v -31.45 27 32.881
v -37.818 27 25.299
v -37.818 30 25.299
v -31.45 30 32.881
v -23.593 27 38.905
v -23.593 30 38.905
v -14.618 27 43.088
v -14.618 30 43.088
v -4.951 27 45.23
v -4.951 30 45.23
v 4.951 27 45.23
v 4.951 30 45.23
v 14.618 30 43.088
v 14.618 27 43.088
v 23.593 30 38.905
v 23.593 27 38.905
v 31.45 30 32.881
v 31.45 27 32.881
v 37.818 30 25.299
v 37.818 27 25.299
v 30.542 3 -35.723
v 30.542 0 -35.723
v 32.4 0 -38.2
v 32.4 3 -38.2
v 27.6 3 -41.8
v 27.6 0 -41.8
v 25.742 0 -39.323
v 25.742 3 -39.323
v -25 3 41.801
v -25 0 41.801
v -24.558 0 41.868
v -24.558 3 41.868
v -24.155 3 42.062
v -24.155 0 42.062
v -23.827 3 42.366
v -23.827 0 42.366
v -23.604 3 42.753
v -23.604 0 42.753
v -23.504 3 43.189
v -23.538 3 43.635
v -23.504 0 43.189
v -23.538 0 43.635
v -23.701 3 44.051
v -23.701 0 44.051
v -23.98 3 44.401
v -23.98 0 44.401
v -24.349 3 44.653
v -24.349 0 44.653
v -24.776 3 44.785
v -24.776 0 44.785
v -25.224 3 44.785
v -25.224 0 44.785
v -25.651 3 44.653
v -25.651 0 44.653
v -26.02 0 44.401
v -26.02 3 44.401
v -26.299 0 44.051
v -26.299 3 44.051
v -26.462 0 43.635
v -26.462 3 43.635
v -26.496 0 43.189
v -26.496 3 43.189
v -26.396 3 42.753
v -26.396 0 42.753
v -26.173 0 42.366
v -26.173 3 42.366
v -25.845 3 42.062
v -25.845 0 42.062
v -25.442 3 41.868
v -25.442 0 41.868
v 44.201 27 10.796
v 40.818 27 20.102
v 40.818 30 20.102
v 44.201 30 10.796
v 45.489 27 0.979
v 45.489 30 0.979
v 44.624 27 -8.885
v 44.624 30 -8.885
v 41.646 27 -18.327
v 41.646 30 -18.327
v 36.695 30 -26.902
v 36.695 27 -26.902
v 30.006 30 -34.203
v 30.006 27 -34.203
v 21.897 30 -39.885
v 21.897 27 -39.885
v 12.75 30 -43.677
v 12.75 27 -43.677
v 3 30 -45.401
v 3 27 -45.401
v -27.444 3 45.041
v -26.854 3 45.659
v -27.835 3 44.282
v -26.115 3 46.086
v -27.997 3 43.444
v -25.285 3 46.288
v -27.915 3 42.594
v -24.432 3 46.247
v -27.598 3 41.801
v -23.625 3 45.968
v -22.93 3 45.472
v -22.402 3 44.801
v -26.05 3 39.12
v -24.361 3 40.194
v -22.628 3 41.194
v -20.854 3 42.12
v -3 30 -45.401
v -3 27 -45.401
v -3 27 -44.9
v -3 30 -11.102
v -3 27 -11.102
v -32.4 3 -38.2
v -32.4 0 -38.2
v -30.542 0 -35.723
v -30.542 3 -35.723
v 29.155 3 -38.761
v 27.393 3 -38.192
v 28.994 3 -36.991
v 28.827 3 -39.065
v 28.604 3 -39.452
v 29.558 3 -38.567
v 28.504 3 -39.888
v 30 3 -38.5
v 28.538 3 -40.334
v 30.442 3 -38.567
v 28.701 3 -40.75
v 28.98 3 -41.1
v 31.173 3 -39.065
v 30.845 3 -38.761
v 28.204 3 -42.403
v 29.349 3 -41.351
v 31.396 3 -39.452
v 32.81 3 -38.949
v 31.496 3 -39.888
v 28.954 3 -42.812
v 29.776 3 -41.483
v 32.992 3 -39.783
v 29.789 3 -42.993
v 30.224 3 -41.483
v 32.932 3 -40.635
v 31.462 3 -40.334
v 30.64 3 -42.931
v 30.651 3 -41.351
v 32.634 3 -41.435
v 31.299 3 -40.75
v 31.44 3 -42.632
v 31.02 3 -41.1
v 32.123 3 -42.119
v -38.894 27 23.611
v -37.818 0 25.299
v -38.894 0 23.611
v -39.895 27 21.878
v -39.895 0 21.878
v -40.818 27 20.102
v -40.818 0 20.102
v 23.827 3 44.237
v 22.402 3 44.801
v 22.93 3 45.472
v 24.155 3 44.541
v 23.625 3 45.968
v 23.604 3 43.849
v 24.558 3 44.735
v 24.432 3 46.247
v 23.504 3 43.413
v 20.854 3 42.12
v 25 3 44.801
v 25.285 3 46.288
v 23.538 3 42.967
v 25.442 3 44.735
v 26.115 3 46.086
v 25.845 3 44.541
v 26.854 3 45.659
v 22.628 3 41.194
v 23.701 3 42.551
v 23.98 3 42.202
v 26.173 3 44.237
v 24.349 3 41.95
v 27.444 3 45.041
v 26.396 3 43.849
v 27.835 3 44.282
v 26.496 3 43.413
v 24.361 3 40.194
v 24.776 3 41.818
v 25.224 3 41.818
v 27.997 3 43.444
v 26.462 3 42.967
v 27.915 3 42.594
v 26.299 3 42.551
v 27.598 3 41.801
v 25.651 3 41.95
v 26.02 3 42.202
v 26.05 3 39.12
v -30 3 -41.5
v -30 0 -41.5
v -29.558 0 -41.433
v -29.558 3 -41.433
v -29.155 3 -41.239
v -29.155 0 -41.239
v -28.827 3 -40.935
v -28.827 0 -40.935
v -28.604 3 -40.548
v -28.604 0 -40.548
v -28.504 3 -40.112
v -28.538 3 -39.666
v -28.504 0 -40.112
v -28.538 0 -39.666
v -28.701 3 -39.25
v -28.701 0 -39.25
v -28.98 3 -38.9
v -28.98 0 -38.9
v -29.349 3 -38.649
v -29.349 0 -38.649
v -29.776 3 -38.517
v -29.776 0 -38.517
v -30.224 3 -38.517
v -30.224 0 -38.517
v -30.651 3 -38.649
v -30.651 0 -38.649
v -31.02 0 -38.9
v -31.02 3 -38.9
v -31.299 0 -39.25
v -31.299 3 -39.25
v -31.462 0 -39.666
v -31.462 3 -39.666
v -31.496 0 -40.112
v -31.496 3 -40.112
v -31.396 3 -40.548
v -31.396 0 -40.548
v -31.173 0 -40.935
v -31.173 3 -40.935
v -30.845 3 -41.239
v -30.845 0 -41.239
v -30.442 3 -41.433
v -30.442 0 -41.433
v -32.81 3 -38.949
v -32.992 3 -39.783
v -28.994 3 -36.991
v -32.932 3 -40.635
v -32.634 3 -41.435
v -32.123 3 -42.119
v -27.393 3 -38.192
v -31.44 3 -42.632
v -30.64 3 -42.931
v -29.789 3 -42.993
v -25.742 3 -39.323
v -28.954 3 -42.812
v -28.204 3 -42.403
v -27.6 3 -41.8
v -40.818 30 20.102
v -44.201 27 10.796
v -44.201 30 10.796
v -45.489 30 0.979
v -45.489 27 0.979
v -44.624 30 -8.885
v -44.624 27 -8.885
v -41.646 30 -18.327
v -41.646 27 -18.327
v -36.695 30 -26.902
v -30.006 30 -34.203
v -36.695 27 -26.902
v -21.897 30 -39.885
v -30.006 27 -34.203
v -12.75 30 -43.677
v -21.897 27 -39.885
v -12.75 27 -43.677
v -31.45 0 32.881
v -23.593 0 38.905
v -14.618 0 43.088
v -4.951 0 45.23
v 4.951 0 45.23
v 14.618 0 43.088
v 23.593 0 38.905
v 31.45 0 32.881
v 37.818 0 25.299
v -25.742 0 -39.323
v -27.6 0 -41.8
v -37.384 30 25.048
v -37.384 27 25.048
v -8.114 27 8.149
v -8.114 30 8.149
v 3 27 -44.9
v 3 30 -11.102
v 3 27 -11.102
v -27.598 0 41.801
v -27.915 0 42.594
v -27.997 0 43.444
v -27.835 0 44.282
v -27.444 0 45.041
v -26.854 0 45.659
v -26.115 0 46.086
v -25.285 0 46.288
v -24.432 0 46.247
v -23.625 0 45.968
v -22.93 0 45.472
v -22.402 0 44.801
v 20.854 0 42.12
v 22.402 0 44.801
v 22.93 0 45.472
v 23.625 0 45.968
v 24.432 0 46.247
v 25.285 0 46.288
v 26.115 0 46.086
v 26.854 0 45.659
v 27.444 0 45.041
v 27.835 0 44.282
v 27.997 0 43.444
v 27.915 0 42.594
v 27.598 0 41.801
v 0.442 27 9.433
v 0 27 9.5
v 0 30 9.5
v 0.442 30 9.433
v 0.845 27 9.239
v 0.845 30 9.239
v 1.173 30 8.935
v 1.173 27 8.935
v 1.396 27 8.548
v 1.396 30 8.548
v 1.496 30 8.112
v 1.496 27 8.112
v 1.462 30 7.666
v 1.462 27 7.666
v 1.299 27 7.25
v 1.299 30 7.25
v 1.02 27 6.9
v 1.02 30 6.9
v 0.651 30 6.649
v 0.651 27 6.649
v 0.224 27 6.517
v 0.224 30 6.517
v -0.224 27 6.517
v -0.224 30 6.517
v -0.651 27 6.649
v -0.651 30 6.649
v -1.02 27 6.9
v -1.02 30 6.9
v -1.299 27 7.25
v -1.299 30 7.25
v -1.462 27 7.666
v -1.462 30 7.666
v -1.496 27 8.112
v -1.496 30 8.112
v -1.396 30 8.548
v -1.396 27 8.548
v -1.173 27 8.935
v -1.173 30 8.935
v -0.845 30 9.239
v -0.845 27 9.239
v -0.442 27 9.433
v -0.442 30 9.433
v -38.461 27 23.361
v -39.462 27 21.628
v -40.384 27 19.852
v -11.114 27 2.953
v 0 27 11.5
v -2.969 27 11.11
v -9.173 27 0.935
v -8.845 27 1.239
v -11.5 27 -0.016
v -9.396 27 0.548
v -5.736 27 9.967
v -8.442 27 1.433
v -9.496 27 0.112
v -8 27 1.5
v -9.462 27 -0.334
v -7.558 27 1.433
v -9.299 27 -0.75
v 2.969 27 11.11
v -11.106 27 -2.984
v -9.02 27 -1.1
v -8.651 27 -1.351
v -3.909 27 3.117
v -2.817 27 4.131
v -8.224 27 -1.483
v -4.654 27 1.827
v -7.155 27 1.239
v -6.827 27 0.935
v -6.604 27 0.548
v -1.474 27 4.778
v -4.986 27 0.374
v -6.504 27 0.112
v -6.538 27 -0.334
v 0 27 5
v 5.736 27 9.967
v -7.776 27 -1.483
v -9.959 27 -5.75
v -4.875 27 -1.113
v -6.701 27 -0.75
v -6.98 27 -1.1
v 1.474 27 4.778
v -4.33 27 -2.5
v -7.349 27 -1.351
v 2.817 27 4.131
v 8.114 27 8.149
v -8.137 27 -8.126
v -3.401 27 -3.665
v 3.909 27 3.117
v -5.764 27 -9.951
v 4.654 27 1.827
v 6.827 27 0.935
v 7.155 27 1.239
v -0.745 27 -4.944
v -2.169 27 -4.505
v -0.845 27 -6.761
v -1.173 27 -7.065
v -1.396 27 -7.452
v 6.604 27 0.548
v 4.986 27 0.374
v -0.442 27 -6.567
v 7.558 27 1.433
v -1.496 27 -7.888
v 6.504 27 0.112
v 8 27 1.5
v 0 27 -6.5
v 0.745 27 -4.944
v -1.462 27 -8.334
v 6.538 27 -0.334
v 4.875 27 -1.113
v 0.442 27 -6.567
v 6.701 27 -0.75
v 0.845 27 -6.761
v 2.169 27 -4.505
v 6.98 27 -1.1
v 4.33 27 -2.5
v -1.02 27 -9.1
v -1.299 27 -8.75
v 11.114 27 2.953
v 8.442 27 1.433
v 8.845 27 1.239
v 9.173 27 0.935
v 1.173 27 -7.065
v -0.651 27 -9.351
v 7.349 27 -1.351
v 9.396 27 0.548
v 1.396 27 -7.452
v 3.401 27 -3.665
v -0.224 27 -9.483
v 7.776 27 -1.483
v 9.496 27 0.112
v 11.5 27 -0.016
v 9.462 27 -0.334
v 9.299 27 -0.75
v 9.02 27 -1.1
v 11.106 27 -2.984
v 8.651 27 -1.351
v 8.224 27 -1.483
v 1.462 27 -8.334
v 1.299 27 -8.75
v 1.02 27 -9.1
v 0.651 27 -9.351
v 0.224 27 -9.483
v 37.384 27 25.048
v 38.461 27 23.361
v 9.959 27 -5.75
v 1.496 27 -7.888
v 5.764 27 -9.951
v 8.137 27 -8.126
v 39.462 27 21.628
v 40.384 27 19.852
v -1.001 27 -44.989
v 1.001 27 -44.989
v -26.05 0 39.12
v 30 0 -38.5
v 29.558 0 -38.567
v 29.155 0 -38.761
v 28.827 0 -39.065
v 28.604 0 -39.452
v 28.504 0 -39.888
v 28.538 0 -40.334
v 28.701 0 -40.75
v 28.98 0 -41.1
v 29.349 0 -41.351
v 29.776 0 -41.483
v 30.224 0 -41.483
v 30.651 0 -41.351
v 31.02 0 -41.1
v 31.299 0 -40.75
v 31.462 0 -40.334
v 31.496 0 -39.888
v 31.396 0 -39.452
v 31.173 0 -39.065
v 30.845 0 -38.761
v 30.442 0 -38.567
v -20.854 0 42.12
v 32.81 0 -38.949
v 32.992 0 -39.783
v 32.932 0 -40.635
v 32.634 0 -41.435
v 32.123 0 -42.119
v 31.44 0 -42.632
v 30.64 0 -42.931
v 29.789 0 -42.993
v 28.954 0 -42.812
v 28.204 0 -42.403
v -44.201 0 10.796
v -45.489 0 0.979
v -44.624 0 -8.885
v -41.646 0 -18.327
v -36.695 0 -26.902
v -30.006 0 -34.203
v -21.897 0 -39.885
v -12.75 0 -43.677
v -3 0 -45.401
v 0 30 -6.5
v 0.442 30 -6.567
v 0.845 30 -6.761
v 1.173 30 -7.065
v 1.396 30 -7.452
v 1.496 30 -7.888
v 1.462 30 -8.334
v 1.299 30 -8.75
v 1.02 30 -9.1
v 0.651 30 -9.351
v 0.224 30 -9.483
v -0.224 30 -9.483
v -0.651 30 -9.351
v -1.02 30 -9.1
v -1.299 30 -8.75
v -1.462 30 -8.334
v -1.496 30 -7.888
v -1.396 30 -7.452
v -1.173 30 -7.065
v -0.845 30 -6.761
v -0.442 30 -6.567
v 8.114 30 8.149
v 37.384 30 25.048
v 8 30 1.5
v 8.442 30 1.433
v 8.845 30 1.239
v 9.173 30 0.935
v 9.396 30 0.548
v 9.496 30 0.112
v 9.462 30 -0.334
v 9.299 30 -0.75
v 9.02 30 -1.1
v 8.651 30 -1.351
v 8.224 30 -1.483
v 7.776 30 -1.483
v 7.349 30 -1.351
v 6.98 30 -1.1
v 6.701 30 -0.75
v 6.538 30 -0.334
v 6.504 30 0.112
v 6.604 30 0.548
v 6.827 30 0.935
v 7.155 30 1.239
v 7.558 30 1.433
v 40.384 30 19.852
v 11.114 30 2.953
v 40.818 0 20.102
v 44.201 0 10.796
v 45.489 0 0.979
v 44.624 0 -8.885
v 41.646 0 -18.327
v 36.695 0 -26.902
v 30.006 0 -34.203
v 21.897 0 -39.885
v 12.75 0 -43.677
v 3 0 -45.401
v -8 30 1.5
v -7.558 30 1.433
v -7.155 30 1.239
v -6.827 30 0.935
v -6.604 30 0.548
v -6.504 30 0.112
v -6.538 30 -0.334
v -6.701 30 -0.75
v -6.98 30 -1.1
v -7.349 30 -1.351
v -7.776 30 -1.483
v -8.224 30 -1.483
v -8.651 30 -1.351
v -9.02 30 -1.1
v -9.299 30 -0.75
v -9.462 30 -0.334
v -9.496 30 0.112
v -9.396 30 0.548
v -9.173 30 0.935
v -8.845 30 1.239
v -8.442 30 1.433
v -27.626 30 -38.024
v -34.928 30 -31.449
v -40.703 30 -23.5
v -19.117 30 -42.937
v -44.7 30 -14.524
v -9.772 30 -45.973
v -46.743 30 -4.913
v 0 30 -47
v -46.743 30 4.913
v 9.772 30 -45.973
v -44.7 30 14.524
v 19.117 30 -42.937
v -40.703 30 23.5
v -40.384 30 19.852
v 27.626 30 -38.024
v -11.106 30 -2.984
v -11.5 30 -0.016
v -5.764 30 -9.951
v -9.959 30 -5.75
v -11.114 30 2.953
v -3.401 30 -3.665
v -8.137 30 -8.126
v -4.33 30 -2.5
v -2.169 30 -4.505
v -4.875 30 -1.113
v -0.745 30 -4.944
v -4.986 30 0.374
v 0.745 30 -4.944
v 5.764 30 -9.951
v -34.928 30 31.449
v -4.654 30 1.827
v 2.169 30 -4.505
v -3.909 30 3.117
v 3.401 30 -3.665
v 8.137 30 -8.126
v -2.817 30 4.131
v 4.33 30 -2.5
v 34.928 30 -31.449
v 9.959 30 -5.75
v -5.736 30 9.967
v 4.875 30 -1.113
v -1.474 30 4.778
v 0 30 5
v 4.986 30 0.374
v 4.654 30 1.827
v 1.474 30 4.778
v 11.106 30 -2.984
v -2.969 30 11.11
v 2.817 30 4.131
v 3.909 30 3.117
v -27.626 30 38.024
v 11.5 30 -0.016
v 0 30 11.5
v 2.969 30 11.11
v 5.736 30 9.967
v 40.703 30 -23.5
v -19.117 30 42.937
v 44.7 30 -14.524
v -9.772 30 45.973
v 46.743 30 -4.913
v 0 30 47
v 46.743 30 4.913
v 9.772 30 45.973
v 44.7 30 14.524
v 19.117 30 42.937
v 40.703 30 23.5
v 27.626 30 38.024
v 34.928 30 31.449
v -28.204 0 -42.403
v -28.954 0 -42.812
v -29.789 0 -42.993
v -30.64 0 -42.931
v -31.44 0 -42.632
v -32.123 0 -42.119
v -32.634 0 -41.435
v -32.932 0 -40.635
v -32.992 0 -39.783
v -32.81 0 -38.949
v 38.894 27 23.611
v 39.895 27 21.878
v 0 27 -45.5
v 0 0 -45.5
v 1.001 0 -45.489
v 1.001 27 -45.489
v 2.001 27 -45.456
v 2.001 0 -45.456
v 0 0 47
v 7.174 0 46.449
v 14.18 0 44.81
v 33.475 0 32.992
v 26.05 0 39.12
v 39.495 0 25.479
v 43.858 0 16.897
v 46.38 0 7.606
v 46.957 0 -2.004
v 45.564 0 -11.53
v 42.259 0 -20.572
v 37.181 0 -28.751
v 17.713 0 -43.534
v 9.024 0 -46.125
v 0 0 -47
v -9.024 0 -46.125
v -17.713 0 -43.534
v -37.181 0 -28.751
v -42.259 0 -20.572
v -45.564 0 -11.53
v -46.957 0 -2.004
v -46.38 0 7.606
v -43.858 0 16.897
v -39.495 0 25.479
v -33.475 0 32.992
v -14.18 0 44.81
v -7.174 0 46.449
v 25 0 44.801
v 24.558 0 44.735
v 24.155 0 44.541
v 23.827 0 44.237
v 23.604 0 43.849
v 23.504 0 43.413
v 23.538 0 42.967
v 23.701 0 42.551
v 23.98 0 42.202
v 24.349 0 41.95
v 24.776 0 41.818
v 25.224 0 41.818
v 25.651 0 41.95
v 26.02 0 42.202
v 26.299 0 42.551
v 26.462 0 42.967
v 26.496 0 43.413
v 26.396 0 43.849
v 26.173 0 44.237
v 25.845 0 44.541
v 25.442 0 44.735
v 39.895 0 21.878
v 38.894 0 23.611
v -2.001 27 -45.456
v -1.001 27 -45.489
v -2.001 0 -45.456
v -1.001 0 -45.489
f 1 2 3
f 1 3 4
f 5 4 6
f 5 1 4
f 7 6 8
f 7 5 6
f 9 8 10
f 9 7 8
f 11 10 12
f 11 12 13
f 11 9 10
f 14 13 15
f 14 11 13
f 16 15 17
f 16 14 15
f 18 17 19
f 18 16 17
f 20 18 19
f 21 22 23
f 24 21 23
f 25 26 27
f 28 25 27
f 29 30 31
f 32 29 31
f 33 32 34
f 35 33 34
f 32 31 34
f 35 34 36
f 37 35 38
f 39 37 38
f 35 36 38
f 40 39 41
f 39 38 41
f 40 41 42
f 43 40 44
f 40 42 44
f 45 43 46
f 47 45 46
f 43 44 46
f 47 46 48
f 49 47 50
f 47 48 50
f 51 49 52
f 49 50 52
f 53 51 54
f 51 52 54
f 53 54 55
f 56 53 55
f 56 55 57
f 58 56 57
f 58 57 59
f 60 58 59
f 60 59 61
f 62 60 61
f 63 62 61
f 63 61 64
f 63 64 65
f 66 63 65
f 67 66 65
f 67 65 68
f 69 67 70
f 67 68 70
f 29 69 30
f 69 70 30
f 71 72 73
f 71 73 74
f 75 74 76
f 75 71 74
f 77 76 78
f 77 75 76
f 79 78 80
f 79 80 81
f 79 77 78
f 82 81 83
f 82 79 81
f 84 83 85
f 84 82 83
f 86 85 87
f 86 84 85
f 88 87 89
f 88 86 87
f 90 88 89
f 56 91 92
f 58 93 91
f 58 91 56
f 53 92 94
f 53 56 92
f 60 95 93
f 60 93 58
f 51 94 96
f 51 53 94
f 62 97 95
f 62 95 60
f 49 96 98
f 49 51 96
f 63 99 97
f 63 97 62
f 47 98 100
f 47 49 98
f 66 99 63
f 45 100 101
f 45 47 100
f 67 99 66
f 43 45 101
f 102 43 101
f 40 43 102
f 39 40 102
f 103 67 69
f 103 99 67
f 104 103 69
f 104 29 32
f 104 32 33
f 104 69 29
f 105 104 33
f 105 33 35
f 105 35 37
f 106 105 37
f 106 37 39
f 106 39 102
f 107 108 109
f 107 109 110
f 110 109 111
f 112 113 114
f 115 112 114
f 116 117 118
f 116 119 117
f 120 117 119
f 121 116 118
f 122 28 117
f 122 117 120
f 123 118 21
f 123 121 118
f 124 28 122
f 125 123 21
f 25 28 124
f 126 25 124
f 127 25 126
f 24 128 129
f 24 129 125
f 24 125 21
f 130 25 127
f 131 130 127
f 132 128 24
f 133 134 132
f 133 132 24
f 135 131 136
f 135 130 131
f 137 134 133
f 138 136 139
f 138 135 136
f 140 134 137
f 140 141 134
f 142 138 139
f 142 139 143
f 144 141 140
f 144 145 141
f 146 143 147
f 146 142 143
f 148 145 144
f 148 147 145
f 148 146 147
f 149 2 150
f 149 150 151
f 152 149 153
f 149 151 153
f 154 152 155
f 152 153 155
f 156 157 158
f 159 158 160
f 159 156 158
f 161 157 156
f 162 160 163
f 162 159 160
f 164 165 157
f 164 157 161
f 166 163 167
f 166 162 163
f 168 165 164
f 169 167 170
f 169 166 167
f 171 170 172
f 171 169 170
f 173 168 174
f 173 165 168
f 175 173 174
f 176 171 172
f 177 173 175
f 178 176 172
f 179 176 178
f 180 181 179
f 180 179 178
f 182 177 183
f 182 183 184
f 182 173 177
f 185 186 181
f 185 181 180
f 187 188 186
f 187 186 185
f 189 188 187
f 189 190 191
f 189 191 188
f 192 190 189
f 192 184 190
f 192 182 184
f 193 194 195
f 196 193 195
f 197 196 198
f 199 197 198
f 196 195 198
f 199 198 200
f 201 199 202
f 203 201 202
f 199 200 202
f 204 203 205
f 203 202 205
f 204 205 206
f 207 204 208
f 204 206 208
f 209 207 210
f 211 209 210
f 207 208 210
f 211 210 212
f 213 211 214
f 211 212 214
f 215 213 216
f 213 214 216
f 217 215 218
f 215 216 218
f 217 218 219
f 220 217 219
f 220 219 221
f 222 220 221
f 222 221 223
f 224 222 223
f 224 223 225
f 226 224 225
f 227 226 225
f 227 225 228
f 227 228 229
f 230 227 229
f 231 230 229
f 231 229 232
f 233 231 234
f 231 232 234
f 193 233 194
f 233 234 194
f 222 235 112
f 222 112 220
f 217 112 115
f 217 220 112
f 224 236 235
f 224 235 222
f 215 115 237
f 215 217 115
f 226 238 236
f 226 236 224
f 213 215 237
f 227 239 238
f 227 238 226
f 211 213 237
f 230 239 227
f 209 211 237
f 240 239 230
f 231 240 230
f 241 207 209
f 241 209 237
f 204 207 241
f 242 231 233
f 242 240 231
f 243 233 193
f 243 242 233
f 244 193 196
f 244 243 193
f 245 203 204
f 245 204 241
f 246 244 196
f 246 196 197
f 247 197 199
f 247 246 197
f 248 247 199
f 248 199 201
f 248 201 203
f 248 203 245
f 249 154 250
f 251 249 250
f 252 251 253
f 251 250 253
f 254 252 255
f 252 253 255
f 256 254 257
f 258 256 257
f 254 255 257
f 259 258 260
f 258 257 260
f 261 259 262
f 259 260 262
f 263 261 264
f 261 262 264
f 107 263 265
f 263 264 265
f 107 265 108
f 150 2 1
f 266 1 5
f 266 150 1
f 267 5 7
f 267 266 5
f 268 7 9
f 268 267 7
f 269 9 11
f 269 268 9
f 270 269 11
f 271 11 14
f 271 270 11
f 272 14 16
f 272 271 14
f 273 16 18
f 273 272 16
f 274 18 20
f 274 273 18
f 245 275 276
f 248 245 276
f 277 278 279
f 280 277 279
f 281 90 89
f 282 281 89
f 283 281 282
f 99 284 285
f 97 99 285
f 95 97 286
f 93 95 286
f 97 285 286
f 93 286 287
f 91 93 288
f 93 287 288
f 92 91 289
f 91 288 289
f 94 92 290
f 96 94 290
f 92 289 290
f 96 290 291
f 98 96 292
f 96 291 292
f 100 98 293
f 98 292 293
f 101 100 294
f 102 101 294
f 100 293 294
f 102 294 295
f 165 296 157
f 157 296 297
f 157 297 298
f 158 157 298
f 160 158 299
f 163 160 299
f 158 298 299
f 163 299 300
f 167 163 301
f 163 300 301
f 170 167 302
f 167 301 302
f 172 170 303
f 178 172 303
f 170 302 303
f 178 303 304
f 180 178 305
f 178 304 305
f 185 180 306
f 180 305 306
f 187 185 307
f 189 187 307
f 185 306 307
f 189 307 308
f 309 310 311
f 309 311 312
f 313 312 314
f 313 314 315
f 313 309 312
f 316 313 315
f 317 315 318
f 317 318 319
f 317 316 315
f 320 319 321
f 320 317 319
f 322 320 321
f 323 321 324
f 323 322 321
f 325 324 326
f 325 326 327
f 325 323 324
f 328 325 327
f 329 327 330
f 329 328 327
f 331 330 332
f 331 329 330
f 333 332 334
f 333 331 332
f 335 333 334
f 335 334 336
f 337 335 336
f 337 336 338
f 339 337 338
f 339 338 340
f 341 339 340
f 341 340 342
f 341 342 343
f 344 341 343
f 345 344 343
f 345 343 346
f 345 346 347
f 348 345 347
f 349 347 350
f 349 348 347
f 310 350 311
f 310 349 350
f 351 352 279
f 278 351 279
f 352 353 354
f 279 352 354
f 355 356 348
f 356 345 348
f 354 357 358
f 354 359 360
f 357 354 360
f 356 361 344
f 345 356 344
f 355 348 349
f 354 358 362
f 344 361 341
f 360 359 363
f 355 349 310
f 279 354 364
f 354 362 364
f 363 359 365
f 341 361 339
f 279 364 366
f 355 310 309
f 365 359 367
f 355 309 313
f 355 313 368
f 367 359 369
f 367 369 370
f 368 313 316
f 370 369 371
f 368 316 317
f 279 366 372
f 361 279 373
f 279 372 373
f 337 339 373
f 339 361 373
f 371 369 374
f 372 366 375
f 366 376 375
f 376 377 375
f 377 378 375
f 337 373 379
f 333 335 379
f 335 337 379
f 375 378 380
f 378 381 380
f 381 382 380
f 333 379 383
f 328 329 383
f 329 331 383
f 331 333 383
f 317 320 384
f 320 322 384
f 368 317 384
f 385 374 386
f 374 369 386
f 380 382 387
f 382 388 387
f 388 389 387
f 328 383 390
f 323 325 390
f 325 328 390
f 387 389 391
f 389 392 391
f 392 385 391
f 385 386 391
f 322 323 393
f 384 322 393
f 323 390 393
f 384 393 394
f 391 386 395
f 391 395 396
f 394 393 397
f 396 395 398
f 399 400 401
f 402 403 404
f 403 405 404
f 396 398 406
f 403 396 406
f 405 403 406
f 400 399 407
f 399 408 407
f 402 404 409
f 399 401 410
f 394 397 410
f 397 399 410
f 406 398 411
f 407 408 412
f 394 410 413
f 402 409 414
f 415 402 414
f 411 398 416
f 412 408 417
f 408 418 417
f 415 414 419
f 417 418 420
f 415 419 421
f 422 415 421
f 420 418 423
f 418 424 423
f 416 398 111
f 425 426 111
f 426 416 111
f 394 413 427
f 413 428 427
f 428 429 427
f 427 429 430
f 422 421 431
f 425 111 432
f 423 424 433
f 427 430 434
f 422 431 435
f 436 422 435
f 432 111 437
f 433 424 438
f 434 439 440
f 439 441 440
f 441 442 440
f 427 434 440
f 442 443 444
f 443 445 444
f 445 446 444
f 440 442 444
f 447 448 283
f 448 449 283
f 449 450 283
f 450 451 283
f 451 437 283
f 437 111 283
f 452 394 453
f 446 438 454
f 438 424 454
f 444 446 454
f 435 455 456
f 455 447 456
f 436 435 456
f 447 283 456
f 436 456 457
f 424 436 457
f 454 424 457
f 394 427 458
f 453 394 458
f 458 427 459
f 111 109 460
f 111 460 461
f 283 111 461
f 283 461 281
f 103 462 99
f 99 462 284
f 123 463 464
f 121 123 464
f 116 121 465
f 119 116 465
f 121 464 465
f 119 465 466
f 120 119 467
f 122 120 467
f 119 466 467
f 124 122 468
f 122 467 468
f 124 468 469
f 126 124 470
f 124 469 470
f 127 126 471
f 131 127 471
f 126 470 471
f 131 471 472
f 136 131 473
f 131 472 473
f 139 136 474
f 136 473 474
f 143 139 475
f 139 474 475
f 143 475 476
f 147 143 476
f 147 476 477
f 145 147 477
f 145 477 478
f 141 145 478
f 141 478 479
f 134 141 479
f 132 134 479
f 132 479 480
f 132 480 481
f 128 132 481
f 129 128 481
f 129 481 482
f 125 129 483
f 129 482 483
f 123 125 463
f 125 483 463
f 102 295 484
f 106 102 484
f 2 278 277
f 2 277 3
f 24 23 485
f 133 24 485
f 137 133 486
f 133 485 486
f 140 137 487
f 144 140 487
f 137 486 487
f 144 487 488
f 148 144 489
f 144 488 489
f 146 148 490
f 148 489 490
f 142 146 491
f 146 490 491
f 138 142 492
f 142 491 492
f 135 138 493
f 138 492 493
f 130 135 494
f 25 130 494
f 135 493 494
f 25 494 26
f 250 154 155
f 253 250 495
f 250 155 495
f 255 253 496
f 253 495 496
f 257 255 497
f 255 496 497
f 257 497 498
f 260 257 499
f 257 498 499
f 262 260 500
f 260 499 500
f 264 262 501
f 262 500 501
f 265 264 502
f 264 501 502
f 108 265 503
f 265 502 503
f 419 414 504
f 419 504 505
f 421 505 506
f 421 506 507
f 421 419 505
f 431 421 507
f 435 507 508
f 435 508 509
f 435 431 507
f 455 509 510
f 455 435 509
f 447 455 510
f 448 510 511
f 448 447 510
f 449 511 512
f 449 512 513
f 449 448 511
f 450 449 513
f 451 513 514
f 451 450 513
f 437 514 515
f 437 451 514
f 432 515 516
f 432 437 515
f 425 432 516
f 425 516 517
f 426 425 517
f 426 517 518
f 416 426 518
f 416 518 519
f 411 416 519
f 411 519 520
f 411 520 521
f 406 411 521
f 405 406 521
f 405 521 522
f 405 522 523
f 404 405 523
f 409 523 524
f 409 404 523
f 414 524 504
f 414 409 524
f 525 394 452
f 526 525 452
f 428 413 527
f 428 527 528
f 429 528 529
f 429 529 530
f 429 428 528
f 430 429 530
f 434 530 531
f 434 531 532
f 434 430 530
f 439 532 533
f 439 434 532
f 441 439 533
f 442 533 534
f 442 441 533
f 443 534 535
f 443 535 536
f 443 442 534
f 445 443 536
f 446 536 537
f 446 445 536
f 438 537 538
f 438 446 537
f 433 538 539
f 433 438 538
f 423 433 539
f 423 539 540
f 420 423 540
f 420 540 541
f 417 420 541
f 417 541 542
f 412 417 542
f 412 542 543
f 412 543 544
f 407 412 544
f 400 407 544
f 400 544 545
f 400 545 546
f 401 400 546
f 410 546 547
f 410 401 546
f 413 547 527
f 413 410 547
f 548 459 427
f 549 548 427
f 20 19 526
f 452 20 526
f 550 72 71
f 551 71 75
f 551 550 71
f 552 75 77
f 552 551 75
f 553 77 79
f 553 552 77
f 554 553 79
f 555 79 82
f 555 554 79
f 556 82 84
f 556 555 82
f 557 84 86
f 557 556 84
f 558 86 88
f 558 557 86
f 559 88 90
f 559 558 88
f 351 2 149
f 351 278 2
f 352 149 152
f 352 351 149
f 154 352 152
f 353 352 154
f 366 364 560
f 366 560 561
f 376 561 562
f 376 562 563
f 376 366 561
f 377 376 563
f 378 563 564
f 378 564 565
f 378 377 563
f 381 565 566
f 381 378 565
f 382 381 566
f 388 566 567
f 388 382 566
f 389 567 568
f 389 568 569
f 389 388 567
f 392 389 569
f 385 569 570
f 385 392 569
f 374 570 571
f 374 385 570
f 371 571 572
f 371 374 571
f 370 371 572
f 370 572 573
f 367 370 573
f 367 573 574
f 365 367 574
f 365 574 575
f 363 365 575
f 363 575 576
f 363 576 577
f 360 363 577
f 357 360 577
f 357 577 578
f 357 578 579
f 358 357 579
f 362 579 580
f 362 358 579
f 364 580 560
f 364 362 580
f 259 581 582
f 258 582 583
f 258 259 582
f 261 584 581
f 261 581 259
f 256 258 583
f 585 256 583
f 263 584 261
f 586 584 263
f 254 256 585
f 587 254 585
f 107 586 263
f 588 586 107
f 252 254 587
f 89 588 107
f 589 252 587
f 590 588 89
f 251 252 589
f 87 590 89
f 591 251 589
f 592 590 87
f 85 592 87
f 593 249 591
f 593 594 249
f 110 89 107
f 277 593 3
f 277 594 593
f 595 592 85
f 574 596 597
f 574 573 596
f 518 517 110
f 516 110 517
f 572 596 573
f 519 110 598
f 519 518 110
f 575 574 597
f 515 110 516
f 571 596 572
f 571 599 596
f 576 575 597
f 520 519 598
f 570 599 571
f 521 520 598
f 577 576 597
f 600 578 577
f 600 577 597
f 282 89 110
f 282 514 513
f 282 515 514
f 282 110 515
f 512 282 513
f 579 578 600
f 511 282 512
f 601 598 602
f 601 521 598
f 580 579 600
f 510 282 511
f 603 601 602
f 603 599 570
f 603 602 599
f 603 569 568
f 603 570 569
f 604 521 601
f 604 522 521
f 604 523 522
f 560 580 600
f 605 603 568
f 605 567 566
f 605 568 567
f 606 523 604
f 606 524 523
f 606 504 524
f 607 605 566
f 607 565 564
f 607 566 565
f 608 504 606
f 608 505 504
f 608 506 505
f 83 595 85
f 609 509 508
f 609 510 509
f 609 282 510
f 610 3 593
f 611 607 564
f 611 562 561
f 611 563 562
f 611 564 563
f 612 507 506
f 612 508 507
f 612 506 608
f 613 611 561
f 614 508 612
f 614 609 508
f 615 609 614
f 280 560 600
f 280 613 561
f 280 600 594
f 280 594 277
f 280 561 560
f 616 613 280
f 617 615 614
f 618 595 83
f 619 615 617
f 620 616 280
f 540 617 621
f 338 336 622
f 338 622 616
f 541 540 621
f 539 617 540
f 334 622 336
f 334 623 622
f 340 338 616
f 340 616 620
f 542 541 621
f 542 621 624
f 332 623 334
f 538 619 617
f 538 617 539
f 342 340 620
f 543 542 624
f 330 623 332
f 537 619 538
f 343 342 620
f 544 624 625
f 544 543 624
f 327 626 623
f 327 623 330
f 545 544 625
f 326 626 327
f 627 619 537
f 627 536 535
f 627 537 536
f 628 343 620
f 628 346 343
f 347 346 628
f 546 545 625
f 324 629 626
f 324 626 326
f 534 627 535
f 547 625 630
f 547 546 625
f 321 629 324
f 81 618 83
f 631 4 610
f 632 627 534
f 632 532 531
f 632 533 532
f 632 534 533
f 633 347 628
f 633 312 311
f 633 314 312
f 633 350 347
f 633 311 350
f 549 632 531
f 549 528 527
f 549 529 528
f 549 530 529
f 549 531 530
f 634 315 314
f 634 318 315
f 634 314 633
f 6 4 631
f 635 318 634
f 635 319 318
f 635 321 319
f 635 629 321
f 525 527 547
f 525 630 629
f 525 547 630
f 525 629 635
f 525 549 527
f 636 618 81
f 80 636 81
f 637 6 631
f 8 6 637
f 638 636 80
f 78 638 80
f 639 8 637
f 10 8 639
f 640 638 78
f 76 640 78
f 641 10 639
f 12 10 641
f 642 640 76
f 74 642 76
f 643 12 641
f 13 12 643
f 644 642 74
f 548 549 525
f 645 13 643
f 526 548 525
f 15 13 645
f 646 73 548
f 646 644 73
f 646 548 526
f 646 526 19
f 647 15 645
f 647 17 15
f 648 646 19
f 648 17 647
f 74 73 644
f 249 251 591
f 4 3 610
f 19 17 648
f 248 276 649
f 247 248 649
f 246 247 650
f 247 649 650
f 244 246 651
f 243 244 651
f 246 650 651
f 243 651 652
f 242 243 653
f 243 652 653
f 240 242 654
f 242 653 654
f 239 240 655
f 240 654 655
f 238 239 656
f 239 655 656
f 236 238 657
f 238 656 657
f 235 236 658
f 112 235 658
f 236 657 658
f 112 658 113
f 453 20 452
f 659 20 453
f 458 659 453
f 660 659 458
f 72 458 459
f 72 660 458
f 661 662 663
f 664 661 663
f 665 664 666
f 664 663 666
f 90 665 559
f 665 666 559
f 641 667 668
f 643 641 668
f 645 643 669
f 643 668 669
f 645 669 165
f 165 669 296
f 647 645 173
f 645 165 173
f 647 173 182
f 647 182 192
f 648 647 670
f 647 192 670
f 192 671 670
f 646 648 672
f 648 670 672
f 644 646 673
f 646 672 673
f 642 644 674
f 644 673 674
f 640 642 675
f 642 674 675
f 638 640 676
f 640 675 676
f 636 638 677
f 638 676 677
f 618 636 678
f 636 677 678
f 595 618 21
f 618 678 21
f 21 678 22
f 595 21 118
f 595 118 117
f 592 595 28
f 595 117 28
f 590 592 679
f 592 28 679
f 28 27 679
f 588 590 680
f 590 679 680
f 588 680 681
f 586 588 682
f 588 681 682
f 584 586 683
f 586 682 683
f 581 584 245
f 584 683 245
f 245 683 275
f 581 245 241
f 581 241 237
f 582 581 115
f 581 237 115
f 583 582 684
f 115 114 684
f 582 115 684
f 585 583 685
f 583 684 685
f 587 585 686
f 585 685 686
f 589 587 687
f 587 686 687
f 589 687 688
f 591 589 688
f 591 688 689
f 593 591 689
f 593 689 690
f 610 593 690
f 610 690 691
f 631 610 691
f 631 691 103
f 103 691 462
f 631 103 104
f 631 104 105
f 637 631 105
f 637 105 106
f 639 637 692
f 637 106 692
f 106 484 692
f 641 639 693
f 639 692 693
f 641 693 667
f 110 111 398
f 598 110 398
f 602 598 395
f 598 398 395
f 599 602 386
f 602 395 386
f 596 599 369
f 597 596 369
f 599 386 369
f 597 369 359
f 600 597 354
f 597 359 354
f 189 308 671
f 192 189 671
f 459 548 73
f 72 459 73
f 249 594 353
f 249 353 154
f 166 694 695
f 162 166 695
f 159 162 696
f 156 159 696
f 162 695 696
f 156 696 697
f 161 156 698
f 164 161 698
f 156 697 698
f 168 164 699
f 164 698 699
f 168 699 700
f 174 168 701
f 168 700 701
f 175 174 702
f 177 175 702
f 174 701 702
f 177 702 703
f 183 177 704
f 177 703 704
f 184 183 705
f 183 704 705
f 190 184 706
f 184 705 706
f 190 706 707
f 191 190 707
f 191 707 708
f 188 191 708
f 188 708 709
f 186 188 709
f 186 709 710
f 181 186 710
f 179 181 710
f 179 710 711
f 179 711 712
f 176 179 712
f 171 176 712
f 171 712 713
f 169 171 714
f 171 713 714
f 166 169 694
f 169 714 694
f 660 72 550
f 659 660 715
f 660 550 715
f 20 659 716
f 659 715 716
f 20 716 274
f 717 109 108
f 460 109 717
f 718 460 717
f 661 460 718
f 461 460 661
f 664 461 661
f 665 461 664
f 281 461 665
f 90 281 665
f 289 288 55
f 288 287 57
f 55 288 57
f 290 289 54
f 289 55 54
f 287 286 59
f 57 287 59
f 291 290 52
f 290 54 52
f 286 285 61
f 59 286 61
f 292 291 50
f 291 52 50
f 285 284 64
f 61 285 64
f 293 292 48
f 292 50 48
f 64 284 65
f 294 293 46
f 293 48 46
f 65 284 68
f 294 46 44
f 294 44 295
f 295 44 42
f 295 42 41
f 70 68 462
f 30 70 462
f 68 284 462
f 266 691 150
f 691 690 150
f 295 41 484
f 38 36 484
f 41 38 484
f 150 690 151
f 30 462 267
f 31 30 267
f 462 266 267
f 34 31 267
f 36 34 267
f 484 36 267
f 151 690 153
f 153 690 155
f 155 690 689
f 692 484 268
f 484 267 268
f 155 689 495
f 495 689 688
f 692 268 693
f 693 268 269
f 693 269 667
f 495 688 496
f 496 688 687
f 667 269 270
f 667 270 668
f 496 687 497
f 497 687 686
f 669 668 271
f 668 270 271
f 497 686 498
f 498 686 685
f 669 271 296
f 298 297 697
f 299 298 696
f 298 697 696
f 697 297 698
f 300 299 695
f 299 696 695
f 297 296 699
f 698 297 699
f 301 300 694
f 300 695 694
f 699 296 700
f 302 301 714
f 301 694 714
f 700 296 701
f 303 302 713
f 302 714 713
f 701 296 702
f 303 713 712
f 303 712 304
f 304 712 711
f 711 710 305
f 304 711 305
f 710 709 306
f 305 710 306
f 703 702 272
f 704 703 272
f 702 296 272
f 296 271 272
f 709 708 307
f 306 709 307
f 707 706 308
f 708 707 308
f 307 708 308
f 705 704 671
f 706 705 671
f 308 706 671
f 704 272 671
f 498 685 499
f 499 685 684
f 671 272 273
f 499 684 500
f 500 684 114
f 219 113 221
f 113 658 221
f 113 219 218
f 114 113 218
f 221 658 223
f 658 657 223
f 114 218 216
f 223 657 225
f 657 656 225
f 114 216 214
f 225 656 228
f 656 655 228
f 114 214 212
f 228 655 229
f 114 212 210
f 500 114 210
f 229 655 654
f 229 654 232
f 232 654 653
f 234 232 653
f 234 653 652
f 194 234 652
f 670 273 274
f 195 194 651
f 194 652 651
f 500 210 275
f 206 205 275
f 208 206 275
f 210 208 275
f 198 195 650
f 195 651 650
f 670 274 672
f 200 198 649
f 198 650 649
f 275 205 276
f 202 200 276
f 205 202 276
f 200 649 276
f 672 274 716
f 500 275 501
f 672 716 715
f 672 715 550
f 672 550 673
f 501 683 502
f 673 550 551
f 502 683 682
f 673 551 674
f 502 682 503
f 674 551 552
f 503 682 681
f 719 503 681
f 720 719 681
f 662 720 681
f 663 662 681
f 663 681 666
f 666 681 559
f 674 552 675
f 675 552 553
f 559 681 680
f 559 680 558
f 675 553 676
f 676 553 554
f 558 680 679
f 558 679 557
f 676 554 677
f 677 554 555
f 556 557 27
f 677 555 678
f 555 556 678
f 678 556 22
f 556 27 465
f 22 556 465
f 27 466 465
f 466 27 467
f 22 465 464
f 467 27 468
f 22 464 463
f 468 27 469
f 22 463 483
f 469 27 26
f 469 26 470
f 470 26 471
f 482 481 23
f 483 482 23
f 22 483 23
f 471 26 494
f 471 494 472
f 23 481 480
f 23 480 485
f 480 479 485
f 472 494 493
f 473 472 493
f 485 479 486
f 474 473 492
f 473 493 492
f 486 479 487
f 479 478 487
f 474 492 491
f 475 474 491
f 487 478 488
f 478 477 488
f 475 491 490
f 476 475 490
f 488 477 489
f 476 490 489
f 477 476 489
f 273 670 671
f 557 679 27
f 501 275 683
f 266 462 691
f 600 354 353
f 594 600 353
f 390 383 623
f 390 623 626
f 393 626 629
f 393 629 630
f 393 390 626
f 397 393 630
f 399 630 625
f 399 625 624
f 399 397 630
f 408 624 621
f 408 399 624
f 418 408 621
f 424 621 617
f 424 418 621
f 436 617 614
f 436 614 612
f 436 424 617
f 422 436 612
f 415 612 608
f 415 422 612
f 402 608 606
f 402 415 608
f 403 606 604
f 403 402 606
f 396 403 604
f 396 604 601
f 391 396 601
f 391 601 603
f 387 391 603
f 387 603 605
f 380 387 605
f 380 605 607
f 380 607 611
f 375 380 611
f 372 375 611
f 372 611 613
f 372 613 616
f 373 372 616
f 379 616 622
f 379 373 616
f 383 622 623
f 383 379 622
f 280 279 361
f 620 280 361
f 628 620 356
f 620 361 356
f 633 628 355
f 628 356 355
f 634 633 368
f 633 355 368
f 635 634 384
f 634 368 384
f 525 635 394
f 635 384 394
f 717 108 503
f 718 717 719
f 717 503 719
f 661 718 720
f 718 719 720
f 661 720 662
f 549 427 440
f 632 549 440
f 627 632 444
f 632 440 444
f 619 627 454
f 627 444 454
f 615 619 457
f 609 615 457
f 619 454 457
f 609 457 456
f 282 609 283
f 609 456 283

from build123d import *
from build123d.topology import SkipClean

# Parameters (mm, degrees)
SKETCH_1_R          = 47
SKETCH_1_R_2        = 45
EXTRUDE_1_DEPTH     = 30
SKETCH_2_R          = 1.5
EXTRUDE_5_DEPTH     = 3
EXTRUDE_START       = -3
SKETCH_3_R          = 5
SKETCH_3_R_2        = 1.5
EXTRUDE_6_DEPTH     = 3
CUT_EXTRUDE_1_DEPTH = 30
CUT_EXTRUDE_START   = 44
SKETCH_5_R          = 45.5
CUT_EXTRUDE_2_DEPTH = 44


with BuildPart() as part:
    # 草图1 → 凸台-拉伸1 (new body)
    with BuildSketch(Plane(origin=(0, 0, 0), x_dir=(1, 0, 0), z_dir=(0, 1, 0))):
        with Locations(Location((0, 0, 0), (0, 0, 270))):
            Circle(SKETCH_1_R)
        with Locations(Location((0, 0, 0), (0, 0, 270))):
            Circle(SKETCH_1_R_2, mode=Mode.SUBTRACT)
    extrude(amount=EXTRUDE_1_DEPTH)

    # 草图2 → 凸台-拉伸5 (add)
    # profile 1 of 4: a face of its own
    with SkipClean():  # the faces are left unmerged after this step: merging them gives an invalid solid
        with BuildSketch(Plane(origin=(0, 0, 0), x_dir=(-1, 0, 0), z_dir=(0, -1, 0))):
            with BuildLine():
                Line((22.401923789, -44.801270189), (19.851868109, -40.38444419))
                ThreePointArc((19.851868109, -40.38444419), (22.5, -38.97114317), (25.048020532, -37.38444419))
                Line((25.048020532, -37.38444419), (27.598076211, -41.801270189))
                ThreePointArc((27.598076211, -41.801270189), (26.5, -45.899346401), (22.401923789, -44.801270189))
            make_face()
            with Locations(Location((25, -43.301270189, 0), (0, 0, 90))):
                Circle(SKETCH_2_R, mode=Mode.SUBTRACT)
        # profile 2 of 4: a face of its own
        with BuildSketch(Plane(origin=(0, 0, 0), x_dir=(-1, 0, 0), z_dir=(0, -1, 0))):
            with BuildLine():
                Line((-27.598076211, -41.801270189), (-25.048020532, -37.38444419))
                ThreePointArc((-25.048020532, -37.38444419), (-22.5, -38.97114317), (-19.851868109, -40.38444419))
                Line((-19.851868109, -40.38444419), (-22.401923789, -44.801270189))
                ThreePointArc((-22.401923789, -44.801270189), (-26.5, -45.899346401), (-27.598076211, -41.801270189))
            make_face()
            with Locations(Location((-25, -43.301270189, 0), (0, 0, 270))):
                Circle(SKETCH_2_R, mode=Mode.SUBTRACT)
        # profile 3 of 4: a face of its own
        with BuildSketch(Plane(origin=(0, 0, 0), x_dir=(-1, 0, 0), z_dir=(0, -1, 0))):
            with BuildLine():
                Line((32.4, 38.2), (29.339933185, 34.119910913))
                ThreePointArc((29.339933185, 34.119910913), (27, 36), (24.539933185, 37.719910913))
                Line((24.539933185, 37.719910913), (27.6, 41.8))
                ThreePointArc((27.6, 41.8), (31.8, 42.4), (32.4, 38.2))
            make_face()
            with Locations(Location((30, 40, 0), (0, 0, 90))):
                Circle(SKETCH_2_R, mode=Mode.SUBTRACT)
        # profile 4 of 4: a face of its own
        with BuildSketch(Plane(origin=(0, 0, 0), x_dir=(-1, 0, 0), z_dir=(0, -1, 0))):
            with BuildLine():
                Line((-27.6, 41.8), (-24.539933185, 37.719910913))
                ThreePointArc((-24.539933185, 37.719910913), (-27, 36), (-29.339933185, 34.119910913))
                Line((-29.339933185, 34.119910913), (-32.4, 38.2))
                ThreePointArc((-32.4, 38.2), (-31.8, 42.4), (-27.6, 41.8))
            make_face()
            with Locations(Location((-30, 40, 0), (0, 0, 270))):
                Circle(SKETCH_2_R, mode=Mode.SUBTRACT)
        extrude(amount=-EXTRUDE_5_DEPTH)

    # 草图3 → 凸台-拉伸6 (add)
    with SkipClean():  # the faces are left unmerged after this step: merging them gives an invalid solid
        with BuildSketch(Plane(origin=(0, 30, 0), x_dir=(1, 0, 0), z_dir=(0, 1, 0)).offset(EXTRUDE_START)):
            with BuildLine():
                Line((-3, 44.899888641), (-3, 11.101801656))
                ThreePointArc((-3, 11.101801656), (-9.959292144, 5.75), (-11.114442262, -2.952824616))
                Line((-11.114442262, -2.952824616), (-40.38444419, -19.851868109))
                ThreePointArc((-40.38444419, -19.851868109), (-38.97114317, -22.5), (-37.38444419, -25.048020532))
                Line((-37.38444419, -25.048020532), (-8.114442262, -8.148977039))
                ThreePointArc((-8.114442262, -8.148977039), (0, -11.5), (8.114442262, -8.148977039))
                Line((8.114442262, -8.148977039), (37.38444419, -25.048020532))
                ThreePointArc((37.38444419, -25.048020532), (38.97114317, -22.5), (40.38444419, -19.851868109))
                Line((40.38444419, -19.851868109), (11.114442262, -2.952824616))
                ThreePointArc((11.114442262, -2.952824616), (9.959292144, 5.75), (3, 11.101801656))
                Line((3, 11.101801656), (3, 44.899888641))
                ThreePointArc((3, 44.899888641), (0, 45), (-3, 44.899888641))
            make_face()
            with Locations(Location((0, 0, 0), (0, 0, 270))):
                Circle(SKETCH_3_R, mode=Mode.SUBTRACT)
            with Locations(Location((8, 0, 0), (0, 0, 270))):
                Circle(SKETCH_3_R_2, mode=Mode.SUBTRACT)
            with Locations(Location((0, -8, 0), (0, 0, 270))):
                Circle(SKETCH_3_R_2, mode=Mode.SUBTRACT)
            with Locations(Location((-8, 0, 0), (0, 0, 270))):
                Circle(SKETCH_3_R_2, mode=Mode.SUBTRACT)
            with Locations(Location((0, 8, 0), (0, 0, 270))):
                Circle(SKETCH_3_R_2, mode=Mode.SUBTRACT)
        extrude(amount=EXTRUDE_6_DEPTH)

    # 草图4 → 切除-拉伸1 (cut)
    with BuildSketch(Plane.XZ):
        with BuildLine():
            Line((-37.38444419, 25.048020532), (-37.818411718, 25.298571801))
            ThreePointArc((-37.818411718, 25.298571801), (0, 45.5), (37.818411718, 25.298571801))
            Line((37.818411718, 25.298571801), (37.38444419, 25.048020532))
            ThreePointArc((37.38444419, 25.048020532), (0, 45), (-37.38444419, 25.048020532))
        make_face()
        with BuildLine():
            Line((-40.38444419, 19.851868109), (-40.818411718, 20.102419378))
            ThreePointArc((-40.818411718, 20.102419378), (-39.404155872, -22.75), (-3, -45.400991179))
            Line((-3, -45.400991179), (-3, -44.899888641))
            ThreePointArc((-3, -44.899888641), (-38.97114317, -22.5), (-40.38444419, 19.851868109))
        make_face()
        with BuildLine():
            Line((40.38444419, 19.851868109), (40.818411718, 20.102419378))
            ThreePointArc((40.818411718, 20.102419378), (39.404155872, -22.75), (3, -45.400991179))
            Line((3, -45.400991179), (3, -44.899888641))
            ThreePointArc((3, -44.899888641), (38.97114317, -22.5), (40.38444419, 19.851868109))
        make_face()
    extrude(amount=-CUT_EXTRUDE_1_DEPTH, mode=Mode.SUBTRACT)

    # 草图5 → 切除-拉伸2 (cut)
    with SkipClean():  # the faces are left unmerged after this step: merging them gives an invalid solid
        with BuildSketch(Plane(origin=(0, 27, 0), x_dir=(-1, 0, 0), z_dir=(0, -1, 0)).offset(CUT_EXTRUDE_START)):
            with Locations(Location((0, 0, 0), (0, 0, 90))):
                Circle(SKETCH_5_R)
        extrude(amount=-CUT_EXTRUDE_2_DEPTH, mode=Mode.SUBTRACT)


solid = part.part
